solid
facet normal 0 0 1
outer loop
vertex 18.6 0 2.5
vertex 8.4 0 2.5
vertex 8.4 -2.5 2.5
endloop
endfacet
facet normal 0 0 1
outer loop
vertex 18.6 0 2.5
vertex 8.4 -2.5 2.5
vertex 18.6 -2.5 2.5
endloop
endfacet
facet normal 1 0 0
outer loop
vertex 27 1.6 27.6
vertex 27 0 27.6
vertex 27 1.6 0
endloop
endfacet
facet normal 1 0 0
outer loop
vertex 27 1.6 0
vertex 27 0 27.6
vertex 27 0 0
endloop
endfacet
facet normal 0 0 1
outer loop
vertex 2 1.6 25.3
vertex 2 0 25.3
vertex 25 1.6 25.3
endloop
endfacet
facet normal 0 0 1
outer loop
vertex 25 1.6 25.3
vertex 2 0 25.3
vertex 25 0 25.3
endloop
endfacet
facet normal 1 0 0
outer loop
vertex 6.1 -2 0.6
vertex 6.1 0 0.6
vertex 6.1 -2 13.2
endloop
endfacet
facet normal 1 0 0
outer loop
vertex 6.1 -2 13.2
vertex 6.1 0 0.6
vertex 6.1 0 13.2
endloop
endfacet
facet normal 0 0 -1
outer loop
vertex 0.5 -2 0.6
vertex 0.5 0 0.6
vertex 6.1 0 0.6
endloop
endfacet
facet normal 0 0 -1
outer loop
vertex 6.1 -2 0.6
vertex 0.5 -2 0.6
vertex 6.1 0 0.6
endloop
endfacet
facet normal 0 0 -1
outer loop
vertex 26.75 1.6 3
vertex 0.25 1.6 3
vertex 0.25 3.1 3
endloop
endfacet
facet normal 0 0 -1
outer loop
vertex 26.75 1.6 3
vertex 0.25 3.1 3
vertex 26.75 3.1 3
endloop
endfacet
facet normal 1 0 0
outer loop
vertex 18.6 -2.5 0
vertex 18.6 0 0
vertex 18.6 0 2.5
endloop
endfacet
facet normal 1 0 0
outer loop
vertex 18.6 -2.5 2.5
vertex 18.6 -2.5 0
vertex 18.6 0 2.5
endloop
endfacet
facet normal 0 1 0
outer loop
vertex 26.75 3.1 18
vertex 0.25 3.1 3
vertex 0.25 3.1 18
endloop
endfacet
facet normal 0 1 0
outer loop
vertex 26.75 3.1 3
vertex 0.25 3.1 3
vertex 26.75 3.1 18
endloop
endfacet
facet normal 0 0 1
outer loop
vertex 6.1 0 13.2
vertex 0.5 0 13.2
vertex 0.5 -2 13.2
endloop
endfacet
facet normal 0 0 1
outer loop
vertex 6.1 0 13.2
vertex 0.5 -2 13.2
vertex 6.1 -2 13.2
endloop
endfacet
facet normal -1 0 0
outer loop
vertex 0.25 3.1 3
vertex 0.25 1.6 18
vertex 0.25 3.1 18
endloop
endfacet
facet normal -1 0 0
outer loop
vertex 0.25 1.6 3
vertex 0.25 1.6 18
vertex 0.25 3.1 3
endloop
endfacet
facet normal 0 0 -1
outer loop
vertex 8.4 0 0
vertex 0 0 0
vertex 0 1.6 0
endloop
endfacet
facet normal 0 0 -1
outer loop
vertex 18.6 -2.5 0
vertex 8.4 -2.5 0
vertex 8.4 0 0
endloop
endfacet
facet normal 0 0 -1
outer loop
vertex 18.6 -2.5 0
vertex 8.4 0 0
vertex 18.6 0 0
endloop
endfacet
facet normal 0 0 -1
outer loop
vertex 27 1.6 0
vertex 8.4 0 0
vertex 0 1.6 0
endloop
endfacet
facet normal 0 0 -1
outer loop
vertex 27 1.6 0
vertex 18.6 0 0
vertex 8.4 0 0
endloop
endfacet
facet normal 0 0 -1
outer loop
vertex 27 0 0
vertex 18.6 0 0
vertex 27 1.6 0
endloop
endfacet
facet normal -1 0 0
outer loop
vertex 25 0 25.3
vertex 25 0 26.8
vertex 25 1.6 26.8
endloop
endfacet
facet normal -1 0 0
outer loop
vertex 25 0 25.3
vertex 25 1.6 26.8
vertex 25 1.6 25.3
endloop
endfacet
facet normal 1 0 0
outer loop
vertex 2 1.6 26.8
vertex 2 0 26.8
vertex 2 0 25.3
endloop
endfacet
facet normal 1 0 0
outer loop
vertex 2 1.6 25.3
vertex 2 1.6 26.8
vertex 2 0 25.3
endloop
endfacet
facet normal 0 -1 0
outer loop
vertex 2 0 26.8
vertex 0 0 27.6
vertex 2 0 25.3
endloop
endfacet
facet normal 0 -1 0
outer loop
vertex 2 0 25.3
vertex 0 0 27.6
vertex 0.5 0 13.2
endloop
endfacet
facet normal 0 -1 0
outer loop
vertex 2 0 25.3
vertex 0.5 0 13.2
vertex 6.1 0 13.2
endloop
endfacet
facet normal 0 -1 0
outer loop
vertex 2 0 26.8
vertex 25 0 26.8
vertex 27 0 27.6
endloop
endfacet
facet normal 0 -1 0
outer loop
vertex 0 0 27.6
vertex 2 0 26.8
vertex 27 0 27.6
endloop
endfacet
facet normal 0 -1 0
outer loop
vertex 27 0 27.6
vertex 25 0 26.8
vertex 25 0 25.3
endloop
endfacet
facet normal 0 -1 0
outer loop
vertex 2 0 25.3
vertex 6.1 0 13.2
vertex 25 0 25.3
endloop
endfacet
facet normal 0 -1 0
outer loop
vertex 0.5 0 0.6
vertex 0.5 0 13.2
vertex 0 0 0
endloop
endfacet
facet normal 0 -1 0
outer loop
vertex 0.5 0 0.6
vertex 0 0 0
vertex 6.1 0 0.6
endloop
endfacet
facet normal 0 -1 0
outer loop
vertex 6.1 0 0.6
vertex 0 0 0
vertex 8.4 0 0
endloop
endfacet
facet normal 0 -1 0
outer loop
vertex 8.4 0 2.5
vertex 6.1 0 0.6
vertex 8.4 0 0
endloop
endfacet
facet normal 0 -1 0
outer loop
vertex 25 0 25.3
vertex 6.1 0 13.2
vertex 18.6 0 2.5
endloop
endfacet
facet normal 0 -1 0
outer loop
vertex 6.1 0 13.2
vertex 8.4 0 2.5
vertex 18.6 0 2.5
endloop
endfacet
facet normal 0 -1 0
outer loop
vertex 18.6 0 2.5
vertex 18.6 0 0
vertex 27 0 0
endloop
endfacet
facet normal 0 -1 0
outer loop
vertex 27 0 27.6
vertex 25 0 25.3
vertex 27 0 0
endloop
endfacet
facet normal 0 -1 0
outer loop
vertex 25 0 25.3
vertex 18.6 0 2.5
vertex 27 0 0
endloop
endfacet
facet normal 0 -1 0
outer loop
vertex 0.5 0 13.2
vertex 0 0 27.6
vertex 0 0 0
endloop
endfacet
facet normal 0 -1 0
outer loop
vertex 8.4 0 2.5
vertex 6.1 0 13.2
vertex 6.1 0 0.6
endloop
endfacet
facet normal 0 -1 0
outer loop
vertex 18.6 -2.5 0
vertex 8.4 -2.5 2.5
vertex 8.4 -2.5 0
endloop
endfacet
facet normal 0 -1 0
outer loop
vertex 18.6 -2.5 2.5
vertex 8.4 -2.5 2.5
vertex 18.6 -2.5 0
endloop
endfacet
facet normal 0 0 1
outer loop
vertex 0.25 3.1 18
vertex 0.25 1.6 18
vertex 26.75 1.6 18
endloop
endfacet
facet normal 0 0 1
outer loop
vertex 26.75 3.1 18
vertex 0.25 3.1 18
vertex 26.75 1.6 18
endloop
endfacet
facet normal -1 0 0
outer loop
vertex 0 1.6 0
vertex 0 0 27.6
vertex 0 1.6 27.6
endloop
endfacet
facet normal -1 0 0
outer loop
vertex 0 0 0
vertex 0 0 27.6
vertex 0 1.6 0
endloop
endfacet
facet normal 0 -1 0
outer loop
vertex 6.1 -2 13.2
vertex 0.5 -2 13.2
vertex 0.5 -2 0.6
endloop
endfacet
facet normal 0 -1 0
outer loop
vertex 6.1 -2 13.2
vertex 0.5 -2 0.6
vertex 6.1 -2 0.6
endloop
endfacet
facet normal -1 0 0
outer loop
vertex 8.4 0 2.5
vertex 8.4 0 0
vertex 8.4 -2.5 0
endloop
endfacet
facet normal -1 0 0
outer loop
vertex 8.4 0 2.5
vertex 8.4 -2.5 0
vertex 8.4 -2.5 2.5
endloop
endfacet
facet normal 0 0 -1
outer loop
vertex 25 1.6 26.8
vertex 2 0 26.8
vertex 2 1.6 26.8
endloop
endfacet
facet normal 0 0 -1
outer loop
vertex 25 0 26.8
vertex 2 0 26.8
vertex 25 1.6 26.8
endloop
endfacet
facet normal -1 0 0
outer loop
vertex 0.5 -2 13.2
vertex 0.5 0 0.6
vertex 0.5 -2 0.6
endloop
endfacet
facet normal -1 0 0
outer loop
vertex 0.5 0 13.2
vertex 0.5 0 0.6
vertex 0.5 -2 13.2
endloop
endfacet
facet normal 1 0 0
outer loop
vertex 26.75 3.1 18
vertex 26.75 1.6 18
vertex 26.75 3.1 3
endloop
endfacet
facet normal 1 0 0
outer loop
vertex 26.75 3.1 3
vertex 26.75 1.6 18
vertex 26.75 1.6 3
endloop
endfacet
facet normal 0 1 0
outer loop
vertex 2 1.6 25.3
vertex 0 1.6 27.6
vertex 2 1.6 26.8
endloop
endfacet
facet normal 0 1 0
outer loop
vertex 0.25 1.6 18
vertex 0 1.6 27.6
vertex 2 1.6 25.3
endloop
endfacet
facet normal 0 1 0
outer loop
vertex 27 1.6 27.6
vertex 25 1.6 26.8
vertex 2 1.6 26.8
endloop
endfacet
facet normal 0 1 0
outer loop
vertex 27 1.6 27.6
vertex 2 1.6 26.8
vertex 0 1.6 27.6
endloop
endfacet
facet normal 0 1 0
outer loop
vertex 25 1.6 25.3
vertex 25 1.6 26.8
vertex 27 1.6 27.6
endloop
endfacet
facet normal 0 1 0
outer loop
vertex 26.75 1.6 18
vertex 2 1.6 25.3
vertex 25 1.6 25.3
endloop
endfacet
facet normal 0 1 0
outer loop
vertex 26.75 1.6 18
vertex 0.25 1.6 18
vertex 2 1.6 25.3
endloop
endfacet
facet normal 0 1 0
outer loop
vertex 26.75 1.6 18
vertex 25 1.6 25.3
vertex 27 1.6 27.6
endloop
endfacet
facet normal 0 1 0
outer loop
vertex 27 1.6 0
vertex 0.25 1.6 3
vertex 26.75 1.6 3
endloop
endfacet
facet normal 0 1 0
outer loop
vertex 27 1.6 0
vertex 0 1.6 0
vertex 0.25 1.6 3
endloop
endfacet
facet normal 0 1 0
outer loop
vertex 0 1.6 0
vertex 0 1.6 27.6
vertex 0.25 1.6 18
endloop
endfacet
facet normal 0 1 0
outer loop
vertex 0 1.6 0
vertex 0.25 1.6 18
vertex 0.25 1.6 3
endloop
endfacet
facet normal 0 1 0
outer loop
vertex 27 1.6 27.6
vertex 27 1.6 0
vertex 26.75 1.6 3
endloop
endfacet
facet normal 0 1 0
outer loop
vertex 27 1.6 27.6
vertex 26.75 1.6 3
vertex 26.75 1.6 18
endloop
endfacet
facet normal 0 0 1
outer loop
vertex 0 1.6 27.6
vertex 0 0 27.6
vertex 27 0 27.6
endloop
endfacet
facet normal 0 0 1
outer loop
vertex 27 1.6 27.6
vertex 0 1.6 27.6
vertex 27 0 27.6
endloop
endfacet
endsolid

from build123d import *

# Parameters (mm, degrees)
SKETCH_1_W      = 27
SKETCH_1_H      = 27.6
SKETCH_1_W_2    = 23
SKETCH_1_H_2    = 1.5
EXTRUDE_1_DEPTH = 1.6
SKETCH_2_W      = 26.5
SKETCH_2_H      = 15
EXTRUDE_2_DEPTH = 1.5
SKETCH_3_W      = 5.6
SKETCH_3_H      = 12.6
EXTRUDE_3_DEPTH = 2
SKETCH_4_W      = 10.2
SKETCH_4_H      = 2.5
EXTRUDE_4_DEPTH = 2.5


with BuildPart() as part:
    # 草图1 → 凸台-拉伸1 (new body)
    with BuildSketch(Plane(origin=(0, 0, 0), x_dir=(1, 0, 0), z_dir=(0, 1, 0))):
        with Locations((13.5, -13.8)):
            Rectangle(SKETCH_1_W, SKETCH_1_H)
        with Locations((13.5, -26.05)):
            Rectangle(SKETCH_1_W_2, SKETCH_1_H_2, mode=Mode.SUBTRACT)
    extrude(amount=EXTRUDE_1_DEPTH)

    # 草图2 → 凸台-拉伸2 (add)
    with BuildSketch(Plane(origin=(0, 1.6, 0), x_dir=(1, 0, 0), z_dir=(0, 1, 0))):
        with Locations((13.5, -10.5)):
            Rectangle(SKETCH_2_W, SKETCH_2_H)
    extrude(amount=EXTRUDE_2_DEPTH)

    # 草图3 → 凸台-拉伸3 (add)
    with BuildSketch(Plane.XZ):
        with Locations((3.3, 6.9)):
            Rectangle(SKETCH_3_W, SKETCH_3_H)
    extrude(amount=EXTRUDE_3_DEPTH)

    # 草图4 → 凸台-拉伸4 (add)
    with BuildSketch(Plane.XZ):
        with Locations((13.5, 1.25)):
            Rectangle(SKETCH_4_W, SKETCH_4_H)
    extrude(amount=EXTRUDE_4_DEPTH)


solid = part.part
